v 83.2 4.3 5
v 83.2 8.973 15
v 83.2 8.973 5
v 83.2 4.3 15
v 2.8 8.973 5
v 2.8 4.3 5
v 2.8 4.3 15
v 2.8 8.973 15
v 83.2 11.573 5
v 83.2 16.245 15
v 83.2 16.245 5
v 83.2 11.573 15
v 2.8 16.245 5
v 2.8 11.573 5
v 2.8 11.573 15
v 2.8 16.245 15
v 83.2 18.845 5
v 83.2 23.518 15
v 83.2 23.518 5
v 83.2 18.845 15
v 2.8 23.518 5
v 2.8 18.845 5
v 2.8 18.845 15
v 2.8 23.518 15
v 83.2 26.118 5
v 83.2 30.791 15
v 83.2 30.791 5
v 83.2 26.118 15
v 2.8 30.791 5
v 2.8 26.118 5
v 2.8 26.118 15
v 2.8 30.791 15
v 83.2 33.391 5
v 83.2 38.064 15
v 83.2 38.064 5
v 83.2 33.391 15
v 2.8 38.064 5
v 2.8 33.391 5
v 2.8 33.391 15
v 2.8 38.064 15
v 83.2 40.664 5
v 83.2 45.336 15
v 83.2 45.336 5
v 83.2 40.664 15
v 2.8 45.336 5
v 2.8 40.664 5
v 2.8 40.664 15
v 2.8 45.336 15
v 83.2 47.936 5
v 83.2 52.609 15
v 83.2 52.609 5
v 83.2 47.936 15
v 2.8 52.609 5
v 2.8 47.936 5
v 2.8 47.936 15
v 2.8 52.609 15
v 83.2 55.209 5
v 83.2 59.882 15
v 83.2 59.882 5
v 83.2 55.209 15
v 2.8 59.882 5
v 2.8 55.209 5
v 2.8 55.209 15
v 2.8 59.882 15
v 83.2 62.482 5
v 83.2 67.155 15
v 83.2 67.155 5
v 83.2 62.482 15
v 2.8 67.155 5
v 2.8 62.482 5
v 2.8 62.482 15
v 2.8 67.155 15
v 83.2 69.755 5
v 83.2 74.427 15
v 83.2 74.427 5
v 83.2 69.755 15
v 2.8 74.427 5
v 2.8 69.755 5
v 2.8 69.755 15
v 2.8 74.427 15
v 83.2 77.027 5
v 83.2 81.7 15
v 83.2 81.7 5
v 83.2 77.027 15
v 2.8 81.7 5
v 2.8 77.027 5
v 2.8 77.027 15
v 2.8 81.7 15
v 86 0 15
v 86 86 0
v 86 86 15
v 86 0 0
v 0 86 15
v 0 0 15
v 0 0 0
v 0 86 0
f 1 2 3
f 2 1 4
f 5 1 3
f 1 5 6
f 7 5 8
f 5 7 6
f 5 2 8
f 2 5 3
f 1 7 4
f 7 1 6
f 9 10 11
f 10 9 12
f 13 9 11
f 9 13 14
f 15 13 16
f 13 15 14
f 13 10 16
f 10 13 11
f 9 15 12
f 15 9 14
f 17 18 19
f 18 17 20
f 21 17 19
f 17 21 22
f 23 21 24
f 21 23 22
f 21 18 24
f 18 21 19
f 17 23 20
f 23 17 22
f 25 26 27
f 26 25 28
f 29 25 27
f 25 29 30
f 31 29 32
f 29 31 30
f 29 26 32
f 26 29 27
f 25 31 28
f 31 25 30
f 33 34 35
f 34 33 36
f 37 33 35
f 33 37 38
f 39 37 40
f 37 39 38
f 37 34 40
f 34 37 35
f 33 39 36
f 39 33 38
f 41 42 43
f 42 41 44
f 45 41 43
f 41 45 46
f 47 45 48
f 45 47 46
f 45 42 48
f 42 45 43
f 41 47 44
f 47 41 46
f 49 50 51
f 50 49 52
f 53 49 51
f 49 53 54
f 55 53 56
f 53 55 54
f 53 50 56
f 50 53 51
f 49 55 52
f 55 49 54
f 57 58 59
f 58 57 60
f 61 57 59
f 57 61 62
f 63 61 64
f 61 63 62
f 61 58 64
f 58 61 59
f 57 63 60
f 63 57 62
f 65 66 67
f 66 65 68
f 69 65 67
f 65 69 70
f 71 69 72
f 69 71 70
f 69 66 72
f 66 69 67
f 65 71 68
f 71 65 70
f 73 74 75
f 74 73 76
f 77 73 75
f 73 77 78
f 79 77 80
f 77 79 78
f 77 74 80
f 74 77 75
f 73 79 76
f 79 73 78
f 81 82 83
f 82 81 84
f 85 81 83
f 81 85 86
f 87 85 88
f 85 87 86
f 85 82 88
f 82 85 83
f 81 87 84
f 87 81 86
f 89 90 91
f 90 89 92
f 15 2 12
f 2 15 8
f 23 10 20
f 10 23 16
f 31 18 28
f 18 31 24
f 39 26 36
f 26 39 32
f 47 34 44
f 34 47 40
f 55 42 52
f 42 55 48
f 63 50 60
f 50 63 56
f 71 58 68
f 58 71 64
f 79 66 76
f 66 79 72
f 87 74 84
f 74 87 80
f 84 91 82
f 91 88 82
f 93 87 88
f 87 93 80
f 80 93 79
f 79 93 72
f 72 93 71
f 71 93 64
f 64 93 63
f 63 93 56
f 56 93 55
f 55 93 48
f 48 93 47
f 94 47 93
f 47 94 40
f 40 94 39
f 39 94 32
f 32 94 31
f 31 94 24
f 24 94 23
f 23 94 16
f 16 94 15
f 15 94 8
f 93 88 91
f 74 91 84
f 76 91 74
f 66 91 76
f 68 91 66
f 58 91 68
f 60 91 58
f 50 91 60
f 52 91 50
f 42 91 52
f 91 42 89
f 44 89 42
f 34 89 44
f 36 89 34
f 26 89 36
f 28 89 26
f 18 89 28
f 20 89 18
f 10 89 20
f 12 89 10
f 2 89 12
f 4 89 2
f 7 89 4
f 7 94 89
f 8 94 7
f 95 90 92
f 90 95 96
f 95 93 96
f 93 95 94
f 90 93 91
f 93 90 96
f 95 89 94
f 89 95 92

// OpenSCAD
//===================================================
// Local Maximum
// Main entry file with all user-editable parameters.
//===================================================

/* [Function] */
// f(x, y) = (1 - x^2)(1 - y^2)
function f(x, y) = (1 - x*x) * (1 - y*y);

/* [Output type] */
// 1 = Surface, 2 = Riemann sum, 3 = x slice, 4 = y slice, 5 = All x slices, 6 = All y slices, 7 = Holder (x), 8 = Holder (y)
output_mode = 8; // [1:Surface, 2:Riemann sum, 3:x slice, 4:y slice, 5:All x slices, 6:All y slices, 7:Holder (x), 8:Holder (y)]

/* [Scaling] */
// Final model width in mm (x direction); height and depth scale proportionally
targetxwidth = 80;
verticalscalefactor = 0.5;
verticaltranslation = 50;

/* [Domain] */
xmin = -0.8;
xmax = 1.2;
ymin = -0.3;
ymax = 1.7;

/* [Subdivisions] */
nx = 29;
ny = 29;
smooth_nx = 100;
smooth_ny = 100;

/* [Slice Parameters] */
// Number of intervals for XSlice / YSlice / AllXSlices / AllYSlices modes
num_slices = 11;
// Index (1-based) of the interval to render (XSlice / YSlice modes)
k = 4;
// Separate slices with a gap (for AllXSlices / AllYSlices modes)
separate_slices = true;
// Gap in mm between slices when separate_slices = true
slice_gap = 3;

/* [Holder Parameters] */
// Margin added around the surface footprint on each side (mm)
holder_margin = 3;
// Total height of the holder box (mm)
holder_height = 15;
// Depth of slots from the top of the holder (mm)
holder_slot_depth = 10;
// Extra clearance added to slot width and ends for fit (mm) — increase if too tight
slot_tolerance = 0.4;

include <MathSurface3d.scad>;
